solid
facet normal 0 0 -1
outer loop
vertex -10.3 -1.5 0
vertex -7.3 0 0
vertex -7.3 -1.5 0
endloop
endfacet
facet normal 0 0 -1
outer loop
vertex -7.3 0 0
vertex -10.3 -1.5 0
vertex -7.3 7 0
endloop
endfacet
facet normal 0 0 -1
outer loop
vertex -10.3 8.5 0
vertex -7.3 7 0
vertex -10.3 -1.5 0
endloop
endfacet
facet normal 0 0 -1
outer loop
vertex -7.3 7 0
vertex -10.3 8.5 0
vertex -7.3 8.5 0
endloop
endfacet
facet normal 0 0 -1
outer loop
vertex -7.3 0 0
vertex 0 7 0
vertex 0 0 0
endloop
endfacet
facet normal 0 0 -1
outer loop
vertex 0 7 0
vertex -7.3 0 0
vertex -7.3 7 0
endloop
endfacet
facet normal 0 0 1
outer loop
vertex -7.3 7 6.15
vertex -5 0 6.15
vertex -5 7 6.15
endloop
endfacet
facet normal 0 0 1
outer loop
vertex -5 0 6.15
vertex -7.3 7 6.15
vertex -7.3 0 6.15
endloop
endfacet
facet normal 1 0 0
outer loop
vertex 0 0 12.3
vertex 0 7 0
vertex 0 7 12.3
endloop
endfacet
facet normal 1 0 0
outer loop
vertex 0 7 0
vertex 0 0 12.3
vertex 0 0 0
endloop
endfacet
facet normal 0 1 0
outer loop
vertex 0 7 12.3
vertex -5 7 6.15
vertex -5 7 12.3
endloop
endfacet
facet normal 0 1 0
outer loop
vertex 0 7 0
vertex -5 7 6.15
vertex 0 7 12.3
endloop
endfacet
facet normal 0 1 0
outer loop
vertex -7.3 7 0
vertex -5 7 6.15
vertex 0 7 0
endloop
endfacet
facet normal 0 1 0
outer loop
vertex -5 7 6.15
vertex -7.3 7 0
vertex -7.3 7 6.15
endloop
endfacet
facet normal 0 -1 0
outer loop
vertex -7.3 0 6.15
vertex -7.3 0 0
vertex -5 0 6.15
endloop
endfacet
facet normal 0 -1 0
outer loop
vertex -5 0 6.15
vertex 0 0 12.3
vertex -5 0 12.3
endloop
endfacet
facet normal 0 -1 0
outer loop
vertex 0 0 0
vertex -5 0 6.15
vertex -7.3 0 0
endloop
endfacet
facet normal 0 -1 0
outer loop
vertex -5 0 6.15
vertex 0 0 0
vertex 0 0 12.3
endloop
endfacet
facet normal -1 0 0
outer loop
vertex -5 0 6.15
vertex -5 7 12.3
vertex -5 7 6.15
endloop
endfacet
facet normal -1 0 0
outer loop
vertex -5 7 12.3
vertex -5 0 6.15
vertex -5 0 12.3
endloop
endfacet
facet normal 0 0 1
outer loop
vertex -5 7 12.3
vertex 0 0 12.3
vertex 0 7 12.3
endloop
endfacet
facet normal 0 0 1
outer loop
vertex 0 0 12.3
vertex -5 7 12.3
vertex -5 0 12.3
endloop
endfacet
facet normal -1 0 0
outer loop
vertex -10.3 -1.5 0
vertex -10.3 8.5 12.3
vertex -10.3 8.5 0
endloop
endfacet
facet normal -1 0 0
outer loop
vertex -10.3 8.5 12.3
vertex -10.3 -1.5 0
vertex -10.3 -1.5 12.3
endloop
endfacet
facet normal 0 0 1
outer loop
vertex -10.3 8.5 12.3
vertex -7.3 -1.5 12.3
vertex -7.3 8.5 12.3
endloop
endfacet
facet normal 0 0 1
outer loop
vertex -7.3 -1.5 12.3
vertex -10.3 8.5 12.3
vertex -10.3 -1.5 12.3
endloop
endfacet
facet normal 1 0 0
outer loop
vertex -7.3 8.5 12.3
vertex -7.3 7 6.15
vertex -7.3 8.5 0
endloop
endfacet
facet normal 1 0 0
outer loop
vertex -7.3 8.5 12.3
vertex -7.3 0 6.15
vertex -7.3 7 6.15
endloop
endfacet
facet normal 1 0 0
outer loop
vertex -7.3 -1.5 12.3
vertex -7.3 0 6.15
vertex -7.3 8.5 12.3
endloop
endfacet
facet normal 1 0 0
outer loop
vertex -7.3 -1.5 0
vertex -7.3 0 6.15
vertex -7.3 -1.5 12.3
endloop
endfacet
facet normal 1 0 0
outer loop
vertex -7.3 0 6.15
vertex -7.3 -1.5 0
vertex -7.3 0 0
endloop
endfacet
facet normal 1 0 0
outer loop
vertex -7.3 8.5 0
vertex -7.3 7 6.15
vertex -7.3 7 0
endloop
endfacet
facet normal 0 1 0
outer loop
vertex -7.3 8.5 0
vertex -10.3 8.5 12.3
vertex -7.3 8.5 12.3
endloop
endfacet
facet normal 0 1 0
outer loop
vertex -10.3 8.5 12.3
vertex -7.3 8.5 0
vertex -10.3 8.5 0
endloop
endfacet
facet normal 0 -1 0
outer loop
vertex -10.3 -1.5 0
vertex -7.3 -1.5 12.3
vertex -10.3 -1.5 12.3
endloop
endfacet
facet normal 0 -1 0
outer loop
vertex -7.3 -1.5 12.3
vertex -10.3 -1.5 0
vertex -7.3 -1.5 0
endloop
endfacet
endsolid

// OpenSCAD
thickness = 2.3;
z_offset = 10;

y = 7;
x = y*2;
z = thickness + z_offset;

neck_l = 5;
neck_offset = 0.7;

base_w = 3;
base_h = 10;

translate([0,0,z]) rotate([0,-180,0]) tab();

module tab() {
    translate([0,0,z/2]) cube([neck_l+thickness+neck_offset,y,z/2]);
    cube([neck_l, y, z/2]);
    translate([neck_l+thickness,-(base_h-y)/2,0]) cube([base_w,base_h,z]);
}
